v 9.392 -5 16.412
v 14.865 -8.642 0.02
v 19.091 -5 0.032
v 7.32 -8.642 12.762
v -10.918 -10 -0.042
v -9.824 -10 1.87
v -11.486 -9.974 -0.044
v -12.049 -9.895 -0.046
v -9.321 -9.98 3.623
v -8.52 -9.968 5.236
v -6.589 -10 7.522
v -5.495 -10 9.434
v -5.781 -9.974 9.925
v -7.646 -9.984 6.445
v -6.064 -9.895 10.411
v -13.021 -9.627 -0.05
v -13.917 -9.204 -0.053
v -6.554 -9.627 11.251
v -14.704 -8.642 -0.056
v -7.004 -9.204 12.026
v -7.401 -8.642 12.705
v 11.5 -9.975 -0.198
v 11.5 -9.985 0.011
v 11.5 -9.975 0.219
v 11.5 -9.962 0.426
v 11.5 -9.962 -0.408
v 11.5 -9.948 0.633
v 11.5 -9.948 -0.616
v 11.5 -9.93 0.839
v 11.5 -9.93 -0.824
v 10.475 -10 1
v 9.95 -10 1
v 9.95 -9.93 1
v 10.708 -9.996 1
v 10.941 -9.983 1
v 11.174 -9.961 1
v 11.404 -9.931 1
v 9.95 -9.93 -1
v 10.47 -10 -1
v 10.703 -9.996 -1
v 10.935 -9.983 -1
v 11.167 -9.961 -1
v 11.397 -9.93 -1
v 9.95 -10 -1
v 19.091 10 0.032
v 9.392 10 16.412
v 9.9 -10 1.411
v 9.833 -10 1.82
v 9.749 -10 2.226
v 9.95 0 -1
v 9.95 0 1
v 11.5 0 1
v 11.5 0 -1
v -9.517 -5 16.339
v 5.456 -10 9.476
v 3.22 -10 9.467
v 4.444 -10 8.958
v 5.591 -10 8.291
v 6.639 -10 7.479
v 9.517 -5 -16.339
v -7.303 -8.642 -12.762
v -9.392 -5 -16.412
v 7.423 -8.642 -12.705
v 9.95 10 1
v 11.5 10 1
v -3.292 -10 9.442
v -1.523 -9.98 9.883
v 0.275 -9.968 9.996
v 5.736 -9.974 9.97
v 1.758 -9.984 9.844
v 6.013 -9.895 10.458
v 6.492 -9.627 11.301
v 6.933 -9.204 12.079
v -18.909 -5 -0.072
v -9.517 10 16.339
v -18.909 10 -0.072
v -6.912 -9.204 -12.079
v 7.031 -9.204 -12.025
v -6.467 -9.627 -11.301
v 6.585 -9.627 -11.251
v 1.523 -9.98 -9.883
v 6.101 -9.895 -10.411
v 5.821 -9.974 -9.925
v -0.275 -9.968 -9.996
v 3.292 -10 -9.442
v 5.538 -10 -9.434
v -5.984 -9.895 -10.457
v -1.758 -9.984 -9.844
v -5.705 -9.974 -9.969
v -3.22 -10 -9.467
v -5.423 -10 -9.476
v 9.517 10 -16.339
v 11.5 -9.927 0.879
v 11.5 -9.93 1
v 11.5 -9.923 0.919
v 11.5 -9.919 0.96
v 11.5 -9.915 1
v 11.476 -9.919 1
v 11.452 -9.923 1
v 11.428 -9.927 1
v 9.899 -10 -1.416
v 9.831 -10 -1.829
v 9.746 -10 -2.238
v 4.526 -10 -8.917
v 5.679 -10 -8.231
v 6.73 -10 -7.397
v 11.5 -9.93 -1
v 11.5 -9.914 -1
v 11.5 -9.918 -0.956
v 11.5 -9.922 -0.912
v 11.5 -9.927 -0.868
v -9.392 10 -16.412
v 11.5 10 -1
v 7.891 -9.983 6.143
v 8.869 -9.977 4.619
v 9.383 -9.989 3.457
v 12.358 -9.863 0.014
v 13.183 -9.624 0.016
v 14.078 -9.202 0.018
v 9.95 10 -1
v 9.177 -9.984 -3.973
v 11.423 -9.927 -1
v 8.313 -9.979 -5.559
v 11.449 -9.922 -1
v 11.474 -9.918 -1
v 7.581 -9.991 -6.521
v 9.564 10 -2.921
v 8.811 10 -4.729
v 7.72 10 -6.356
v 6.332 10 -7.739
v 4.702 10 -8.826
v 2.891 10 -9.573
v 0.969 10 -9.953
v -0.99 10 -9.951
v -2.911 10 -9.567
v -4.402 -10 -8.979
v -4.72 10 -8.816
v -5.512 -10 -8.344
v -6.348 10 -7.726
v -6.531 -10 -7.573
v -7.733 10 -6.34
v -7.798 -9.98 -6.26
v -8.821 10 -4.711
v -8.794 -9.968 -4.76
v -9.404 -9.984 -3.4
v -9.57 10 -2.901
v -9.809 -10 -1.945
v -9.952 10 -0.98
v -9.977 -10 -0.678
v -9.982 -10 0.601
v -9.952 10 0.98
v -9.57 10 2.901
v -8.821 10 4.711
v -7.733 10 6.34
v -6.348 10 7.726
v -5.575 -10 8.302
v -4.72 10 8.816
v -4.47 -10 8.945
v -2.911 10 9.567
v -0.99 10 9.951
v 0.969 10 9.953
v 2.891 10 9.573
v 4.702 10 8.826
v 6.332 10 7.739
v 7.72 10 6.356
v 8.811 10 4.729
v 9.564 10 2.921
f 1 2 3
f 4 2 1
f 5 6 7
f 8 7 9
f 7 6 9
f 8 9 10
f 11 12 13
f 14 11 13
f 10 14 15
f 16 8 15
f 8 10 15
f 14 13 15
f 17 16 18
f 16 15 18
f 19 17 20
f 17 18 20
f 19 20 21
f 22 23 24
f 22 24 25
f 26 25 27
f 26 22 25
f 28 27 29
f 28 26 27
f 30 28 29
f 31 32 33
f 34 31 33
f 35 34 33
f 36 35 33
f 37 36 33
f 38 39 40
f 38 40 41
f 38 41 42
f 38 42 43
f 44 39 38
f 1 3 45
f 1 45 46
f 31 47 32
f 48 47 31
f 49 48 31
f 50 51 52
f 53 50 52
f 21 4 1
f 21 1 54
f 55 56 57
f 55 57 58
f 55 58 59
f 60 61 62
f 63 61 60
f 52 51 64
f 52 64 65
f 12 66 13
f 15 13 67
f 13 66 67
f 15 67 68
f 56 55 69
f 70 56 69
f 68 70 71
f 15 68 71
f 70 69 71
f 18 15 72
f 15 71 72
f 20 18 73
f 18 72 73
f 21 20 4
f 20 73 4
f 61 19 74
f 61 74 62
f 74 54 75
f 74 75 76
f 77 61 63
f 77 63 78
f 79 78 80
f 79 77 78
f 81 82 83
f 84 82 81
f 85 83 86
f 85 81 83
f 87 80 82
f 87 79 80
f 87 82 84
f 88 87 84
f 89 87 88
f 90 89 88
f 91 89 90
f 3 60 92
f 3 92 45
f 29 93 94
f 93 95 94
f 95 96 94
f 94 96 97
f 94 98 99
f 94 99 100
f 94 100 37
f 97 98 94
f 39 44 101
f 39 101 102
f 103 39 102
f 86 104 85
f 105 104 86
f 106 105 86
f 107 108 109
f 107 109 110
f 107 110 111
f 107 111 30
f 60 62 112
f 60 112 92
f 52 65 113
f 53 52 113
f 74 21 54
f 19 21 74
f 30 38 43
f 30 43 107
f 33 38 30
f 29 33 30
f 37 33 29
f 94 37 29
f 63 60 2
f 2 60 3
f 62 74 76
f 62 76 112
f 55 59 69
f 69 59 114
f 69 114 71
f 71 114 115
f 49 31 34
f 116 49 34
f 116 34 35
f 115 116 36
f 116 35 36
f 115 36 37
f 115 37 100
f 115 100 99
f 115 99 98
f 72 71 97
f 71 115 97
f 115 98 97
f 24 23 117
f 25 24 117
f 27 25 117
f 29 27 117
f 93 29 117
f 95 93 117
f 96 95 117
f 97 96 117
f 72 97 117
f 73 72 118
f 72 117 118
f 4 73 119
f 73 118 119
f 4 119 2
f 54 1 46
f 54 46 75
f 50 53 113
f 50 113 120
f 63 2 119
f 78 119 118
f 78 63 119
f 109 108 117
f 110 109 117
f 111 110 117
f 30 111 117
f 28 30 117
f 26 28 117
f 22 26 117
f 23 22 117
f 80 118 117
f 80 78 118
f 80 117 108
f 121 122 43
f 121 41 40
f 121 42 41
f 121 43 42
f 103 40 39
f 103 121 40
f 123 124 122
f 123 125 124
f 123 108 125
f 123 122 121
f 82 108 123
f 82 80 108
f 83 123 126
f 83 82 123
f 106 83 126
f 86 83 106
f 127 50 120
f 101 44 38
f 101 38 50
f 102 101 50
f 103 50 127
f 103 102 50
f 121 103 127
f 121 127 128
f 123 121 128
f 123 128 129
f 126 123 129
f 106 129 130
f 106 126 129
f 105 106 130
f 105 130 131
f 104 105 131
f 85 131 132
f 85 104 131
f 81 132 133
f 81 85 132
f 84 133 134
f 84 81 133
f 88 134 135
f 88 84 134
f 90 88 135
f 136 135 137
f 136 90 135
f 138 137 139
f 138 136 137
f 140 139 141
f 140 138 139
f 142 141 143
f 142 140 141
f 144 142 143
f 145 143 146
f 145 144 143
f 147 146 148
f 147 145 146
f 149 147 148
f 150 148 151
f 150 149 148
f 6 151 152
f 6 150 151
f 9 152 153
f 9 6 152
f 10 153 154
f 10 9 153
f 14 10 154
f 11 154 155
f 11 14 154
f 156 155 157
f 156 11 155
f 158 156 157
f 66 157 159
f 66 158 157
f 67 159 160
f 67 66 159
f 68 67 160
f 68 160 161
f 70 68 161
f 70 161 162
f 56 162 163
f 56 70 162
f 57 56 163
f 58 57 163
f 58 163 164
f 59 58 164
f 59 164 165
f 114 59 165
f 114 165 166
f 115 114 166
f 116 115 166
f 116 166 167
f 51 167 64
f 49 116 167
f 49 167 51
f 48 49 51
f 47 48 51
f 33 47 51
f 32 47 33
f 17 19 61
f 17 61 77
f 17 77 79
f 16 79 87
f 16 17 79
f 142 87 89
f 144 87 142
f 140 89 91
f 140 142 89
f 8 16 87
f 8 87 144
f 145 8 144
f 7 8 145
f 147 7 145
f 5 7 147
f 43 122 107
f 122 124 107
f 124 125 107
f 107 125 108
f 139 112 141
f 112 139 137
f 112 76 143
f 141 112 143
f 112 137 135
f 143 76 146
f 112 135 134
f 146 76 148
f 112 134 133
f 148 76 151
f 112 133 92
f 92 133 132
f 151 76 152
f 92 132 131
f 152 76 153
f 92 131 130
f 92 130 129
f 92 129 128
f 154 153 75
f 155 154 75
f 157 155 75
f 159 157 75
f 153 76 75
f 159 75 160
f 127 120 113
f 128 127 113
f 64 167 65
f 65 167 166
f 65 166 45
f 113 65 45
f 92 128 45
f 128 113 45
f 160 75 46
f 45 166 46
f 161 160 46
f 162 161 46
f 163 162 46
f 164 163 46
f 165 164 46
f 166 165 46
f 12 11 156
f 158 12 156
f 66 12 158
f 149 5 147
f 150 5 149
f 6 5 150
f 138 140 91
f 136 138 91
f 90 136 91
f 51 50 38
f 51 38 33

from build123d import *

# Parameters (mm, degrees)
F1_DEPTH     = 10
F2_SIZE      = 5
F3_T1_DEPTH  = 22.73867608
F3_T3_DEPTH  = 22.73867608
F3_T5_DEPTH  = 22.762654105
F3_T7_DEPTH  = 22.8342533194
F3_T9_DEPTH  = 22.7705922303
F3_T11_DEPTH = 22.7699440814
F0_W         = 1.5501256289
F0_H         = 2
F4_DEPTH     = 9.9305


# Not quite as in the source:
# - a fillet or chamfer that OpenCascade refuses, or shapes differently, is made with other operations: its cross-section is extruded or revolved along the edge and cut away or added


with BuildPart() as f1:
    # F0 (on Front) → F1 (new body, symmetric)
    with BuildSketch(Plane.XZ):
        Polygon((-9.3917044375, -16.4117172223), (9.5171118155, -16.3393132389), (19.091183747, 0.0319395585), (9.3917044375, 16.4117172223), (-9.5171118155, 16.3393132389), (-18.908816253, -0.0724039835), align=None)
        with BuildLine():
            ThreePointArc((9.9498743711, -1), (-10, 0), (9.9498743711, 1))
            Line((9.9498743711, 1), (11.5, 1))
            Line((11.5, 1), (11.5, -1))
            Line((11.5, -1), (9.9498743711, -1))
        make_face(mode=Mode.SUBTRACT)
    extrude(amount=F1_DEPTH, both=True)

    # F2
    f2_edges = [f1.edges().sort_by_distance(p)[0] for p in [
        (-14.212964, -10, 8.133455),
        (-14.15026, -10, -8.242061),
        (14.241444, -10, 8.221828),
        (0.062704, -10, -16.375515),
        (14.304148, -10, -8.153687),
        (-0.062704, -10, 16.375515),
    ]]
    chamfer(f2_edges, length=F2_SIZE)

    # F3: fillet of radius 4.6368466753 on 6 edges, made by hand

    # F3_s2 → F3_t1 (cut)
    with BuildSketch(Plane(origin=(5.6469256621, 0, 9.8678304624), x_dir=(0, 1, 0), z_dir=(-0.4966802502, 0, -0.8679335972))):
        with BuildLine():
            ThreePointArc((-10, -9.4549905003), (-9.6470410634, -11.2294349014), (-8.6418990521, -12.7337362278))
            Line((-8.6418990521, -12.7337362278), (-10, -11.3756352799))
            Line((-10, -11.3756352799), (-10, -9.4549905003))
        make_face()
    extrude(amount=F3_T1_DEPTH, mode=Mode.SUBTRACT)

    # F3_s4 → F3_t3 (cut)
    with BuildSketch(Plane(origin=(-5.7223290296, 0, 9.8242963078), x_dir=(0, 1, 0), z_dir=(0.5033124188, 0, -0.8641045128))):
        with BuildLine():
            ThreePointArc((-8.6418990521, -12.7337362278), (-9.6470410634, -11.2294349014), (-10, -9.4549905003))
            Line((-10, -9.4549905003), (-10, -11.3756352799))
            Line((-10, -11.3756352799), (-8.6418990521, -12.7337362278))
        make_face()
    extrude(amount=F3_T3_DEPTH, mode=Mode.SUBTRACT)

    # F3_s6 → F3_t5 (cut)
    with BuildSketch(Plane(origin=(11.393232541, 0, 0.0436259684), x_dir=(0, 1, 0), z_dir=(-0.999992669, 0, -0.0038290844))):
        with BuildLine():
            ThreePointArc((-10, -9.4549905003), (-9.6470410634, -11.2294349014), (-8.6418990521, -12.7337362278))
            Line((-8.6418990521, -12.7337362278), (-10, -11.3756352799))
            Line((-10, -11.3756352799), (-10, -9.4549905003))
        make_face()
    extrude(amount=F3_T5_DEPTH, mode=Mode.SUBTRACT)

    # F3_s8 → F3_t7 (cut)
    with BuildSketch(Plane(origin=(5.8897484246, 0, -9.9461802651), x_dir=(0, 1, 0), z_dir=(-0.5095280522, 0, 0.8604540453))):
        with BuildLine():
            ThreePointArc((-10, -9.5227156054), (-9.6470410634, -11.2971600064), (-8.6418990521, -12.8014613328))
            Line((-8.6418990521, -12.8014613328), (-10, -11.443360385))
            Line((-10, -11.443360385), (-10, -9.5227156054))
        make_face()
    extrude(amount=F3_T7_DEPTH, mode=Mode.SUBTRACT)

    # F3_s10 → F3_t9 (cut)
    with BuildSketch(Plane(origin=(-5.677308487, 0, -9.7079542659), x_dir=(0, 1, 0), z_dir=(0.5048217704, 0, 0.863223598))):
        with BuildLine():
            ThreePointArc((-8.6418990521, -12.8219374878), (-9.6470410634, -11.3176361614), (-10, -9.5431917603))
            Line((-10, -9.5431917603), (-10, -11.4638365399))
            Line((-10, -11.4638365399), (-8.6418990521, -12.8219374878))
        make_face()
    extrude(amount=F3_T9_DEPTH, mode=Mode.SUBTRACT)

    # F3_s12 → F3_t11 (cut)
    with BuildSketch(Plane(origin=(-11.3692546917, 0, -0.0435341545), x_dir=(0, 1, 0), z_dir=(0.999992669, 0, 0.0038290844))):
        with BuildLine():
            ThreePointArc((-8.6418990521, -12.7337362278), (-9.6470410634, -11.2294349014), (-10, -9.4549905003))
            Line((-10, -9.4549905003), (-10, -11.3756352799))
            Line((-10, -11.3756352799), (-8.6418990521, -12.7337362278))
        make_face()
    extrude(amount=F3_T11_DEPTH, mode=Mode.SUBTRACT)

    # F0 (on Front) → F4 (join)
    with BuildSketch(Plane.XZ):
        with Locations((10.7249371855, 0)):
            Rectangle(F0_W, F0_H)
    extrude(amount=F4_DEPTH)


solid = f1.part
